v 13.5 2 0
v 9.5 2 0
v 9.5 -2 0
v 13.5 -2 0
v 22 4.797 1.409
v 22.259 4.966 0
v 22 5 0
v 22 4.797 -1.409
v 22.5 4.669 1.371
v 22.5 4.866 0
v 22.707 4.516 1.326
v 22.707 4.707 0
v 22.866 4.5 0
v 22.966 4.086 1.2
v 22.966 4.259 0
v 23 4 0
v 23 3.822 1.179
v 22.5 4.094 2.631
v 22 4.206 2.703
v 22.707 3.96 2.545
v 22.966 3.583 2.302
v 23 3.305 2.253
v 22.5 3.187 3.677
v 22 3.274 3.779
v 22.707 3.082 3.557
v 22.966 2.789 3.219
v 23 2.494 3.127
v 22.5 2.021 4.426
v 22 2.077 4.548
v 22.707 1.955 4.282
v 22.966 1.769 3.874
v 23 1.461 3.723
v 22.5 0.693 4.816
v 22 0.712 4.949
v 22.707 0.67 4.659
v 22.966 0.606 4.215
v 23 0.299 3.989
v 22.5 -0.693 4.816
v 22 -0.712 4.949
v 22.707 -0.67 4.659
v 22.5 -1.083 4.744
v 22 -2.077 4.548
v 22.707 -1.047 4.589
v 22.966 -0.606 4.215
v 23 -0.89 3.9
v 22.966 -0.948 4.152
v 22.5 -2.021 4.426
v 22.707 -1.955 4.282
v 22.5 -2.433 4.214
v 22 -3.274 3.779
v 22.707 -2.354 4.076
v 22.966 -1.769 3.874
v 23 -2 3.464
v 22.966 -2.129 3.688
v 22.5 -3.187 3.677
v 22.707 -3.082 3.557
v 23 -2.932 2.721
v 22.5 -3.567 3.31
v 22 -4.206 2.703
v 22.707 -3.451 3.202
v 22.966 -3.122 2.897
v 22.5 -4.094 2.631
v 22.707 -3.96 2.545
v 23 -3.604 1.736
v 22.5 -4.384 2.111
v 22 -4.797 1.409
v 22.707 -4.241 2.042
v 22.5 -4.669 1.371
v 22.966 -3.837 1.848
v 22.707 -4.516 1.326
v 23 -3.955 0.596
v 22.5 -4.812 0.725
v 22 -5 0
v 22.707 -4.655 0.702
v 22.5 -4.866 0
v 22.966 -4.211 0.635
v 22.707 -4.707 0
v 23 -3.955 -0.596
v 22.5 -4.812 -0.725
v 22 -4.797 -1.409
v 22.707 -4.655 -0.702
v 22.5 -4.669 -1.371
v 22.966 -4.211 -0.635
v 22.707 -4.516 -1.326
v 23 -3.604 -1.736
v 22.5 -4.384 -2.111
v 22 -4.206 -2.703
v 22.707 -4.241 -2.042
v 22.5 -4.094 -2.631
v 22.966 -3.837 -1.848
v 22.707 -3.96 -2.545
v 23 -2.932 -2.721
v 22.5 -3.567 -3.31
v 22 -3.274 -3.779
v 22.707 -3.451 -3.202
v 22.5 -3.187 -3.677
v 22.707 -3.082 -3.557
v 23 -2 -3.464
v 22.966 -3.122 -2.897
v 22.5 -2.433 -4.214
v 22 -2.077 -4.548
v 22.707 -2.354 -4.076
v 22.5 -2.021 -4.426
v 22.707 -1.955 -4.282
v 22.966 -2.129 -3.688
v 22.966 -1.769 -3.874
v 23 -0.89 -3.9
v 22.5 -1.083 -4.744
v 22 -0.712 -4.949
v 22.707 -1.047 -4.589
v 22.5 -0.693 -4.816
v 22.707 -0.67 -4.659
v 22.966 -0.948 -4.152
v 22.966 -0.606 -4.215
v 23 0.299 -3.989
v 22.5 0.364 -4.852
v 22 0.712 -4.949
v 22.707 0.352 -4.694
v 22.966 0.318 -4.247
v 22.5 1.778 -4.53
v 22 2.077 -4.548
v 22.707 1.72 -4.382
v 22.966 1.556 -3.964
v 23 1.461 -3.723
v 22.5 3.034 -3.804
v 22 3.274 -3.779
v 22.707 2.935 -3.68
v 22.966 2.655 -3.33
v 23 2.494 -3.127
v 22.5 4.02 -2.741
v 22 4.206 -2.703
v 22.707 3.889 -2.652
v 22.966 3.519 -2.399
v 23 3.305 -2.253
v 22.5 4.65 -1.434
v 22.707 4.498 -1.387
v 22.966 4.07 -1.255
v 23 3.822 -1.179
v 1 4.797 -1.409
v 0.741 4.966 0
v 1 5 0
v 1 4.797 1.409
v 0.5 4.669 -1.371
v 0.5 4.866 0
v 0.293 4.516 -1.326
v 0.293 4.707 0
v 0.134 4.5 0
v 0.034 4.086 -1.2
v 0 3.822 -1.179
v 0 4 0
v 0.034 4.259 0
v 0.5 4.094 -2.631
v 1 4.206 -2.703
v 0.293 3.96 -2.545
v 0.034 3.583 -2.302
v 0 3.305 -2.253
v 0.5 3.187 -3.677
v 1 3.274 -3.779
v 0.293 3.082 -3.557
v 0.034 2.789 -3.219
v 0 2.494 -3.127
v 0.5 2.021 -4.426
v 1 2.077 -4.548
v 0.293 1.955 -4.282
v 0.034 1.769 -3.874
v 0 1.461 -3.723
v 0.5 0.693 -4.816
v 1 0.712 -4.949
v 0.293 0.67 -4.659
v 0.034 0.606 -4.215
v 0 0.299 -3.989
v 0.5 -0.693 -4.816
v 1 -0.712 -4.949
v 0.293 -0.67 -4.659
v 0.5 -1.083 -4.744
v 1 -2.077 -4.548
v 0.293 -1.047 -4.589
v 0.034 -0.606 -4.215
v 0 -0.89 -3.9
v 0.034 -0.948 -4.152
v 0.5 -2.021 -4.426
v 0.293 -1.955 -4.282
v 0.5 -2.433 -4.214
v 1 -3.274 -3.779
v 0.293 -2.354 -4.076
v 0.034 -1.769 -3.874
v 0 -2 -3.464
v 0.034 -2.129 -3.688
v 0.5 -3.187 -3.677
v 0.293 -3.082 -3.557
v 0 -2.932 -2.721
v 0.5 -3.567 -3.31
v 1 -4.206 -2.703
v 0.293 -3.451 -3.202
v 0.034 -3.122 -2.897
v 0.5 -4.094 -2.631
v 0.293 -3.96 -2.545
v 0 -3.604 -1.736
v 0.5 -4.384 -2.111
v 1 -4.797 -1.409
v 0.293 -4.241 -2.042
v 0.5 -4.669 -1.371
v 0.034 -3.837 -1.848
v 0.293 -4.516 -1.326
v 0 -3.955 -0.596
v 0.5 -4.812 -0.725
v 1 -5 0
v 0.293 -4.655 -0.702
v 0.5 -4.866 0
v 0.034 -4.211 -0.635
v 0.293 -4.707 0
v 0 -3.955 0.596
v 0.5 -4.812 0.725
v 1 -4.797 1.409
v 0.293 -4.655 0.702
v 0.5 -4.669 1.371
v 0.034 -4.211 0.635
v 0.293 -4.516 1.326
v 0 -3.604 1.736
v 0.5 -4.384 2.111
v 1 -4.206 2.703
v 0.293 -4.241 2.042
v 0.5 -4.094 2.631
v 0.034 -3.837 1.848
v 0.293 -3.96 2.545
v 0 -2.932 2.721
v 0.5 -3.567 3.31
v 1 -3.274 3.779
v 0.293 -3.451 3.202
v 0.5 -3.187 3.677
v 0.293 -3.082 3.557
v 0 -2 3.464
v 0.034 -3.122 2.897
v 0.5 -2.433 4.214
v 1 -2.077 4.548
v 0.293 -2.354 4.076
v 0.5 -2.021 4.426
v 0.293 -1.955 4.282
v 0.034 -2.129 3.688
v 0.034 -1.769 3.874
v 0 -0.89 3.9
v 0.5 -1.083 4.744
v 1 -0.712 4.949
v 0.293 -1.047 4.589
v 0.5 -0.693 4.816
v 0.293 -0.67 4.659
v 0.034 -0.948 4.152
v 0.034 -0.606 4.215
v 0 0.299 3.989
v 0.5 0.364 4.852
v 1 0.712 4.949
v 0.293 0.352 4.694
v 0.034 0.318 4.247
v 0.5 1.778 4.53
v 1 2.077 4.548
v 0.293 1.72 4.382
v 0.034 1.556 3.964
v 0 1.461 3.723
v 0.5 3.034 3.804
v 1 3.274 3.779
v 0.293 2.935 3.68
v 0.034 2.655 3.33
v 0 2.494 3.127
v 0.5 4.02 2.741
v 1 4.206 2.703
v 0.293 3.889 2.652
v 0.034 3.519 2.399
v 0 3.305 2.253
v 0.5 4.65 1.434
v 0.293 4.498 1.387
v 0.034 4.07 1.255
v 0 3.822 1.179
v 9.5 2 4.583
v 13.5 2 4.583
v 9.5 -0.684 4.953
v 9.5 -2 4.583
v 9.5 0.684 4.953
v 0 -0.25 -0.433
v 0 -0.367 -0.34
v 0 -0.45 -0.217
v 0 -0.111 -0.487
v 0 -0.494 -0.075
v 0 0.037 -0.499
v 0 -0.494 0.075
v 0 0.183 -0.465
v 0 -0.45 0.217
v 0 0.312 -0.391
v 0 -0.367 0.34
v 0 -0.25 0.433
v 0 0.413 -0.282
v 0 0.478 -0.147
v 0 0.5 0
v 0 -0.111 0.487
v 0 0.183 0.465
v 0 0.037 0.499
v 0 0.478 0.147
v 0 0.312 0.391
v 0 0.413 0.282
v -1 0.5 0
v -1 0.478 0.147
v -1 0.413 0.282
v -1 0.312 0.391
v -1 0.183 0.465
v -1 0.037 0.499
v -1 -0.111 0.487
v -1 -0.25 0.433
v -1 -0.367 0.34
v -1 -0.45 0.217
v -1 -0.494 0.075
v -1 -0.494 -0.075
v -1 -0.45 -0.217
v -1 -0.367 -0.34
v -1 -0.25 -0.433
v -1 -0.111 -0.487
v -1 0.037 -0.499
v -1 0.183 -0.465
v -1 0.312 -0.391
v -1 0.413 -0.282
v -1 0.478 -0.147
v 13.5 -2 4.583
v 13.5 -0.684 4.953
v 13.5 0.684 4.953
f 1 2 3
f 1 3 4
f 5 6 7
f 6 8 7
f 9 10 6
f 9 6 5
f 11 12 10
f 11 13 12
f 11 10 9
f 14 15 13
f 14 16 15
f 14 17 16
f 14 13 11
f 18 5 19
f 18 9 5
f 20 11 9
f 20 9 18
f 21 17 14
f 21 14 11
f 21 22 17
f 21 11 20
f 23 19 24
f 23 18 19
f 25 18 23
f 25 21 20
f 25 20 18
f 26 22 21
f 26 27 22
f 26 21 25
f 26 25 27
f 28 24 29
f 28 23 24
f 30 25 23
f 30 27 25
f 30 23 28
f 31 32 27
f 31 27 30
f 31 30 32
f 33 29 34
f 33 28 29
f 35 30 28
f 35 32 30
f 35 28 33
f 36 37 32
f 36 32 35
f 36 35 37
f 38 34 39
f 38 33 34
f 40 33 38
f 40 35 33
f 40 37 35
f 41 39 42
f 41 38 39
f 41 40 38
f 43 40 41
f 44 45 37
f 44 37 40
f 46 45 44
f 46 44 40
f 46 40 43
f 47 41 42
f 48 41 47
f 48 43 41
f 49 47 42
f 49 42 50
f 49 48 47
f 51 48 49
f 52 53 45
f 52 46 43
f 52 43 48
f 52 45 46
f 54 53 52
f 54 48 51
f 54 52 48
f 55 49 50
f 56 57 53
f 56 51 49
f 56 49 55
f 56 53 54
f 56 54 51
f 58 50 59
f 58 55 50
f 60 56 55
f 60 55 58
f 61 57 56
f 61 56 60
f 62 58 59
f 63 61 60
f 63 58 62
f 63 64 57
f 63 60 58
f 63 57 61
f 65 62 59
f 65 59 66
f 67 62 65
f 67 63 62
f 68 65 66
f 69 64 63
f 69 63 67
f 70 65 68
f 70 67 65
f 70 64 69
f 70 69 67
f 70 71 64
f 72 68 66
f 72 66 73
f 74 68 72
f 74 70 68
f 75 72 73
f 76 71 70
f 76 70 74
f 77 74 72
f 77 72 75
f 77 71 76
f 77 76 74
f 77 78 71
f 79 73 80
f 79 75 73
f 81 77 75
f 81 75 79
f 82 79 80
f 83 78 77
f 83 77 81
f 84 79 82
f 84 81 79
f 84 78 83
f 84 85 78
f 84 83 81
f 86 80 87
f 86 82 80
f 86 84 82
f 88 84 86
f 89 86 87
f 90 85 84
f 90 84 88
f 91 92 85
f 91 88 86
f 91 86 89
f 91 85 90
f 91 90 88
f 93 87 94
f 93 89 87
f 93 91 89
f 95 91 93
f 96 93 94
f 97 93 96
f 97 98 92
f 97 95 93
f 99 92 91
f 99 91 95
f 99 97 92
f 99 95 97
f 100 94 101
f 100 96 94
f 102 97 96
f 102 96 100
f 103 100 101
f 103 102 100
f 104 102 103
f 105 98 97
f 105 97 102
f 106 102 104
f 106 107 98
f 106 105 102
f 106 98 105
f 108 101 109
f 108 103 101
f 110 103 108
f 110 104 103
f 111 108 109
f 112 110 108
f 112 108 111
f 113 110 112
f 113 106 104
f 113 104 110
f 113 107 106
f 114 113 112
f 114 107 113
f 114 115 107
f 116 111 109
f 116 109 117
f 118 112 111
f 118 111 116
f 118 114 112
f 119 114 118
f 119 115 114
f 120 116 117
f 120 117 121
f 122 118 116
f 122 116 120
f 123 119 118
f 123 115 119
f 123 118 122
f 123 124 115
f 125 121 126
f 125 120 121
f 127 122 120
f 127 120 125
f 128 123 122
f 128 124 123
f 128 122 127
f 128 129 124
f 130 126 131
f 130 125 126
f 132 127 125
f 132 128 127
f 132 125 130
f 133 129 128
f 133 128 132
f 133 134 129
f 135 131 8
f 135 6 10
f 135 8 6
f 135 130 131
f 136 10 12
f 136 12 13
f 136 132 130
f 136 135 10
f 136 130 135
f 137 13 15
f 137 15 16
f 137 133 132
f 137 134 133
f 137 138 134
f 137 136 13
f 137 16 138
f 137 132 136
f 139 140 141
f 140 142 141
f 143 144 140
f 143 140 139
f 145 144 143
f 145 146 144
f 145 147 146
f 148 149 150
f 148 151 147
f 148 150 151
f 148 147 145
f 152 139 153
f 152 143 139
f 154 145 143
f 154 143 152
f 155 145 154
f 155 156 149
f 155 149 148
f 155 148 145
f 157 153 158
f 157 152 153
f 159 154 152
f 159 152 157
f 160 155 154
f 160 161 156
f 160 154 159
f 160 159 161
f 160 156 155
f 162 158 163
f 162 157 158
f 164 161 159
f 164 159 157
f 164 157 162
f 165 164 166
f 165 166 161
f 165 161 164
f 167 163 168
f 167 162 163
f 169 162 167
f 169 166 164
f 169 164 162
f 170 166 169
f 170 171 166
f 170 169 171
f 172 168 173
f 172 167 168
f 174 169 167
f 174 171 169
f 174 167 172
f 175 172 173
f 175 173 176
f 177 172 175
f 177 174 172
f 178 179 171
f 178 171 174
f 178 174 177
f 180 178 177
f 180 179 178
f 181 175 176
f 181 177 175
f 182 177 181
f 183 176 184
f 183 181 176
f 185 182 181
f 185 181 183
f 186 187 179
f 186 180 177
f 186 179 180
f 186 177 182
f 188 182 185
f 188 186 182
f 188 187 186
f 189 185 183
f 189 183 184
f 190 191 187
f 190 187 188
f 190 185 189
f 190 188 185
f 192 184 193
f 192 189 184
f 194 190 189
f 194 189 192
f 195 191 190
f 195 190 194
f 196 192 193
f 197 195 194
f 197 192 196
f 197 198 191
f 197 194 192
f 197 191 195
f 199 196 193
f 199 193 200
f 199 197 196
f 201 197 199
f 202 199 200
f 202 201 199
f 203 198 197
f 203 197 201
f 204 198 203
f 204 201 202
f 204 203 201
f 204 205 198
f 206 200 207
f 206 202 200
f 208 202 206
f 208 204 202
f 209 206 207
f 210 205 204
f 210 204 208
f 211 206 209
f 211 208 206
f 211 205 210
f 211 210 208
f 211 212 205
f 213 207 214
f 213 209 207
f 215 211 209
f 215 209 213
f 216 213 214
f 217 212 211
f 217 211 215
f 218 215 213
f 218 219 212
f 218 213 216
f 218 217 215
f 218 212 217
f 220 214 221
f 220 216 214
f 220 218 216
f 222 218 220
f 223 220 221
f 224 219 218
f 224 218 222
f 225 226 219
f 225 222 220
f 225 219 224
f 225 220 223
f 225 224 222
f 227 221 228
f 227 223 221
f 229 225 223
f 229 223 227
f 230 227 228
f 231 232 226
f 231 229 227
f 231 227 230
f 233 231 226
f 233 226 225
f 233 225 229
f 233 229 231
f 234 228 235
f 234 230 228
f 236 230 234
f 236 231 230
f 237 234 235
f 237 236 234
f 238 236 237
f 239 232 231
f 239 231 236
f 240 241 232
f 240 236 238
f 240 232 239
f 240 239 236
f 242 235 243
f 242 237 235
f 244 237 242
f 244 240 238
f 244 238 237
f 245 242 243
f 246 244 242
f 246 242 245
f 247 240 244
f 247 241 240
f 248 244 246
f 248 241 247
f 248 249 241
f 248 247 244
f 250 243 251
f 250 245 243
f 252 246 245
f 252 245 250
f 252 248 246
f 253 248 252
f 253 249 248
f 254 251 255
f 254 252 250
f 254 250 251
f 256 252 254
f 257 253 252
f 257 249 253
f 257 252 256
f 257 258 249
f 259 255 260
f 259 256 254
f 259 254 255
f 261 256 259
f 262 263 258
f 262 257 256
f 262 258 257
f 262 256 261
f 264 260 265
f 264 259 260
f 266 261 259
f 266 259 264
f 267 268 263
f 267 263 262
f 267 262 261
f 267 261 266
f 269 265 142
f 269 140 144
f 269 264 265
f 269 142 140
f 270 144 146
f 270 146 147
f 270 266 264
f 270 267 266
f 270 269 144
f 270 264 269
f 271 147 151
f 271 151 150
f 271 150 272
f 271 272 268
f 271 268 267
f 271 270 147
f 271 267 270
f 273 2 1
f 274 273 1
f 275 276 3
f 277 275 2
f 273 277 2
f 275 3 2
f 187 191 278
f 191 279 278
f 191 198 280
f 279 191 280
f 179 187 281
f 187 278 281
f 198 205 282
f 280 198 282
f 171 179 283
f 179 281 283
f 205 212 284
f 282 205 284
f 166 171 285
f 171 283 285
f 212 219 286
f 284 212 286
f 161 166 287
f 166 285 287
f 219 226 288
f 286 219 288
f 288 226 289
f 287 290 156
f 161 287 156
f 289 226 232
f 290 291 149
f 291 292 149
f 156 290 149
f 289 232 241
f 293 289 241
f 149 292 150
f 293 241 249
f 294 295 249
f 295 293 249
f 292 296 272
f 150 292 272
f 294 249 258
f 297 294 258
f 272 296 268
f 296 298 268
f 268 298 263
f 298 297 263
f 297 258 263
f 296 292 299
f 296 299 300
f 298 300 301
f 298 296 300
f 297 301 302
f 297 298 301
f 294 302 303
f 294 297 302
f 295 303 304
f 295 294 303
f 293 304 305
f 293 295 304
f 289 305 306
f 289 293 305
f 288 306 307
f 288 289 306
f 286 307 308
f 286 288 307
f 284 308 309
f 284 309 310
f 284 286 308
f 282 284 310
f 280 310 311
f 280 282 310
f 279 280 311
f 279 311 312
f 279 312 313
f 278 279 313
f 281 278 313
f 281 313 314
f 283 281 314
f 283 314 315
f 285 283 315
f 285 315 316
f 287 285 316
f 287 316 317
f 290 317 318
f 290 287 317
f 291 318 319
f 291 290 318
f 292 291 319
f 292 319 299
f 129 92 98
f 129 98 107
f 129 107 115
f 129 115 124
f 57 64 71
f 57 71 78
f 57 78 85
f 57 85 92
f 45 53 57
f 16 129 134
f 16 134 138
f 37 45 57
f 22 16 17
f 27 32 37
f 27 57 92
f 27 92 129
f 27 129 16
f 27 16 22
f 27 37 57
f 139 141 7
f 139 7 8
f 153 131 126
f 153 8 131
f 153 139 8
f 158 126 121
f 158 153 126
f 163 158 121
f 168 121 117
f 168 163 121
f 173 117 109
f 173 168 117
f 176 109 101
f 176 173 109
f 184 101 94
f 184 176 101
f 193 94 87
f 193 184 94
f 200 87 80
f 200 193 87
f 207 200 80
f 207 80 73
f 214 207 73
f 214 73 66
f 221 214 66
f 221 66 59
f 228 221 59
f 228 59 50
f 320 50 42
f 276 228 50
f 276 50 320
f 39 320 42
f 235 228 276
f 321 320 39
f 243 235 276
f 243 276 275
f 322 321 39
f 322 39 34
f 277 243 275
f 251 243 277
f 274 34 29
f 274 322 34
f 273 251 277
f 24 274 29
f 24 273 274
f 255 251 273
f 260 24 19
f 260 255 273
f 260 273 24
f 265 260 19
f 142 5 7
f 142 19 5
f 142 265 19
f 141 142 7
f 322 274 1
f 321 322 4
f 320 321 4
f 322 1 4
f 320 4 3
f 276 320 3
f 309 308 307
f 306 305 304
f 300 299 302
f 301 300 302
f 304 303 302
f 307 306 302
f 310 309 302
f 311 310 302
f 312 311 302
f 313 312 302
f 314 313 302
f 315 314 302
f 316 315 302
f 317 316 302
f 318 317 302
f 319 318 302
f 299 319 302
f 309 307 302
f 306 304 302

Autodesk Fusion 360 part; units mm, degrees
sketch "Sketch1" plane through (0, 0, 0) normal (1, 0, 0) x (0, 1, 0)
  circle A0 centre (0, 0) radius 5
  circle A1 centre (0, 0) radius 0.5
  dimension "d1" = 10
  dimension "d2" = 1
extrude "Extrude1" add sketch "Sketch1" along normal blind 23 contours A0 | A1
extrude "Extrude2" add sketch "Sketch1" against normal blind 1 contours A1
fillet "Fillet1" radius 1 2 edges at (0, -4.6616, -1.8081) (23, -4.6616, -1.8081)
sketch "Sketch2" plane through (0, 0, 0) normal (0, 0, 1) x (1, 0, 0)
  line L0 (0, 15) -> (0, -10) construction
  line L1 (11.5, 15) -> (11.5, -7) construction
  line L2 (-5, 0) -> (27.3814, 0) construction
  line L3 (9.5, 2) -> (13.5, 2)
  line L4 (13.5, 2) -> (13.5, -2)
  line L5 (13.5, -2) -> (9.5, -2)
  line L6 (9.5, -2) -> (9.5, 2)
  line L7 (9.5, 2) -> (13.5, -2) construction
  line L8 (13.5, 2) -> (9.5, -2) construction
  point P0 (11.5, 0)
  dimension "d9" = 11.5
  dimension "d10" = 4
  dimension "d11" = 4
extrude "Extrude3" cut sketch "Sketch2" along normal blind 5
